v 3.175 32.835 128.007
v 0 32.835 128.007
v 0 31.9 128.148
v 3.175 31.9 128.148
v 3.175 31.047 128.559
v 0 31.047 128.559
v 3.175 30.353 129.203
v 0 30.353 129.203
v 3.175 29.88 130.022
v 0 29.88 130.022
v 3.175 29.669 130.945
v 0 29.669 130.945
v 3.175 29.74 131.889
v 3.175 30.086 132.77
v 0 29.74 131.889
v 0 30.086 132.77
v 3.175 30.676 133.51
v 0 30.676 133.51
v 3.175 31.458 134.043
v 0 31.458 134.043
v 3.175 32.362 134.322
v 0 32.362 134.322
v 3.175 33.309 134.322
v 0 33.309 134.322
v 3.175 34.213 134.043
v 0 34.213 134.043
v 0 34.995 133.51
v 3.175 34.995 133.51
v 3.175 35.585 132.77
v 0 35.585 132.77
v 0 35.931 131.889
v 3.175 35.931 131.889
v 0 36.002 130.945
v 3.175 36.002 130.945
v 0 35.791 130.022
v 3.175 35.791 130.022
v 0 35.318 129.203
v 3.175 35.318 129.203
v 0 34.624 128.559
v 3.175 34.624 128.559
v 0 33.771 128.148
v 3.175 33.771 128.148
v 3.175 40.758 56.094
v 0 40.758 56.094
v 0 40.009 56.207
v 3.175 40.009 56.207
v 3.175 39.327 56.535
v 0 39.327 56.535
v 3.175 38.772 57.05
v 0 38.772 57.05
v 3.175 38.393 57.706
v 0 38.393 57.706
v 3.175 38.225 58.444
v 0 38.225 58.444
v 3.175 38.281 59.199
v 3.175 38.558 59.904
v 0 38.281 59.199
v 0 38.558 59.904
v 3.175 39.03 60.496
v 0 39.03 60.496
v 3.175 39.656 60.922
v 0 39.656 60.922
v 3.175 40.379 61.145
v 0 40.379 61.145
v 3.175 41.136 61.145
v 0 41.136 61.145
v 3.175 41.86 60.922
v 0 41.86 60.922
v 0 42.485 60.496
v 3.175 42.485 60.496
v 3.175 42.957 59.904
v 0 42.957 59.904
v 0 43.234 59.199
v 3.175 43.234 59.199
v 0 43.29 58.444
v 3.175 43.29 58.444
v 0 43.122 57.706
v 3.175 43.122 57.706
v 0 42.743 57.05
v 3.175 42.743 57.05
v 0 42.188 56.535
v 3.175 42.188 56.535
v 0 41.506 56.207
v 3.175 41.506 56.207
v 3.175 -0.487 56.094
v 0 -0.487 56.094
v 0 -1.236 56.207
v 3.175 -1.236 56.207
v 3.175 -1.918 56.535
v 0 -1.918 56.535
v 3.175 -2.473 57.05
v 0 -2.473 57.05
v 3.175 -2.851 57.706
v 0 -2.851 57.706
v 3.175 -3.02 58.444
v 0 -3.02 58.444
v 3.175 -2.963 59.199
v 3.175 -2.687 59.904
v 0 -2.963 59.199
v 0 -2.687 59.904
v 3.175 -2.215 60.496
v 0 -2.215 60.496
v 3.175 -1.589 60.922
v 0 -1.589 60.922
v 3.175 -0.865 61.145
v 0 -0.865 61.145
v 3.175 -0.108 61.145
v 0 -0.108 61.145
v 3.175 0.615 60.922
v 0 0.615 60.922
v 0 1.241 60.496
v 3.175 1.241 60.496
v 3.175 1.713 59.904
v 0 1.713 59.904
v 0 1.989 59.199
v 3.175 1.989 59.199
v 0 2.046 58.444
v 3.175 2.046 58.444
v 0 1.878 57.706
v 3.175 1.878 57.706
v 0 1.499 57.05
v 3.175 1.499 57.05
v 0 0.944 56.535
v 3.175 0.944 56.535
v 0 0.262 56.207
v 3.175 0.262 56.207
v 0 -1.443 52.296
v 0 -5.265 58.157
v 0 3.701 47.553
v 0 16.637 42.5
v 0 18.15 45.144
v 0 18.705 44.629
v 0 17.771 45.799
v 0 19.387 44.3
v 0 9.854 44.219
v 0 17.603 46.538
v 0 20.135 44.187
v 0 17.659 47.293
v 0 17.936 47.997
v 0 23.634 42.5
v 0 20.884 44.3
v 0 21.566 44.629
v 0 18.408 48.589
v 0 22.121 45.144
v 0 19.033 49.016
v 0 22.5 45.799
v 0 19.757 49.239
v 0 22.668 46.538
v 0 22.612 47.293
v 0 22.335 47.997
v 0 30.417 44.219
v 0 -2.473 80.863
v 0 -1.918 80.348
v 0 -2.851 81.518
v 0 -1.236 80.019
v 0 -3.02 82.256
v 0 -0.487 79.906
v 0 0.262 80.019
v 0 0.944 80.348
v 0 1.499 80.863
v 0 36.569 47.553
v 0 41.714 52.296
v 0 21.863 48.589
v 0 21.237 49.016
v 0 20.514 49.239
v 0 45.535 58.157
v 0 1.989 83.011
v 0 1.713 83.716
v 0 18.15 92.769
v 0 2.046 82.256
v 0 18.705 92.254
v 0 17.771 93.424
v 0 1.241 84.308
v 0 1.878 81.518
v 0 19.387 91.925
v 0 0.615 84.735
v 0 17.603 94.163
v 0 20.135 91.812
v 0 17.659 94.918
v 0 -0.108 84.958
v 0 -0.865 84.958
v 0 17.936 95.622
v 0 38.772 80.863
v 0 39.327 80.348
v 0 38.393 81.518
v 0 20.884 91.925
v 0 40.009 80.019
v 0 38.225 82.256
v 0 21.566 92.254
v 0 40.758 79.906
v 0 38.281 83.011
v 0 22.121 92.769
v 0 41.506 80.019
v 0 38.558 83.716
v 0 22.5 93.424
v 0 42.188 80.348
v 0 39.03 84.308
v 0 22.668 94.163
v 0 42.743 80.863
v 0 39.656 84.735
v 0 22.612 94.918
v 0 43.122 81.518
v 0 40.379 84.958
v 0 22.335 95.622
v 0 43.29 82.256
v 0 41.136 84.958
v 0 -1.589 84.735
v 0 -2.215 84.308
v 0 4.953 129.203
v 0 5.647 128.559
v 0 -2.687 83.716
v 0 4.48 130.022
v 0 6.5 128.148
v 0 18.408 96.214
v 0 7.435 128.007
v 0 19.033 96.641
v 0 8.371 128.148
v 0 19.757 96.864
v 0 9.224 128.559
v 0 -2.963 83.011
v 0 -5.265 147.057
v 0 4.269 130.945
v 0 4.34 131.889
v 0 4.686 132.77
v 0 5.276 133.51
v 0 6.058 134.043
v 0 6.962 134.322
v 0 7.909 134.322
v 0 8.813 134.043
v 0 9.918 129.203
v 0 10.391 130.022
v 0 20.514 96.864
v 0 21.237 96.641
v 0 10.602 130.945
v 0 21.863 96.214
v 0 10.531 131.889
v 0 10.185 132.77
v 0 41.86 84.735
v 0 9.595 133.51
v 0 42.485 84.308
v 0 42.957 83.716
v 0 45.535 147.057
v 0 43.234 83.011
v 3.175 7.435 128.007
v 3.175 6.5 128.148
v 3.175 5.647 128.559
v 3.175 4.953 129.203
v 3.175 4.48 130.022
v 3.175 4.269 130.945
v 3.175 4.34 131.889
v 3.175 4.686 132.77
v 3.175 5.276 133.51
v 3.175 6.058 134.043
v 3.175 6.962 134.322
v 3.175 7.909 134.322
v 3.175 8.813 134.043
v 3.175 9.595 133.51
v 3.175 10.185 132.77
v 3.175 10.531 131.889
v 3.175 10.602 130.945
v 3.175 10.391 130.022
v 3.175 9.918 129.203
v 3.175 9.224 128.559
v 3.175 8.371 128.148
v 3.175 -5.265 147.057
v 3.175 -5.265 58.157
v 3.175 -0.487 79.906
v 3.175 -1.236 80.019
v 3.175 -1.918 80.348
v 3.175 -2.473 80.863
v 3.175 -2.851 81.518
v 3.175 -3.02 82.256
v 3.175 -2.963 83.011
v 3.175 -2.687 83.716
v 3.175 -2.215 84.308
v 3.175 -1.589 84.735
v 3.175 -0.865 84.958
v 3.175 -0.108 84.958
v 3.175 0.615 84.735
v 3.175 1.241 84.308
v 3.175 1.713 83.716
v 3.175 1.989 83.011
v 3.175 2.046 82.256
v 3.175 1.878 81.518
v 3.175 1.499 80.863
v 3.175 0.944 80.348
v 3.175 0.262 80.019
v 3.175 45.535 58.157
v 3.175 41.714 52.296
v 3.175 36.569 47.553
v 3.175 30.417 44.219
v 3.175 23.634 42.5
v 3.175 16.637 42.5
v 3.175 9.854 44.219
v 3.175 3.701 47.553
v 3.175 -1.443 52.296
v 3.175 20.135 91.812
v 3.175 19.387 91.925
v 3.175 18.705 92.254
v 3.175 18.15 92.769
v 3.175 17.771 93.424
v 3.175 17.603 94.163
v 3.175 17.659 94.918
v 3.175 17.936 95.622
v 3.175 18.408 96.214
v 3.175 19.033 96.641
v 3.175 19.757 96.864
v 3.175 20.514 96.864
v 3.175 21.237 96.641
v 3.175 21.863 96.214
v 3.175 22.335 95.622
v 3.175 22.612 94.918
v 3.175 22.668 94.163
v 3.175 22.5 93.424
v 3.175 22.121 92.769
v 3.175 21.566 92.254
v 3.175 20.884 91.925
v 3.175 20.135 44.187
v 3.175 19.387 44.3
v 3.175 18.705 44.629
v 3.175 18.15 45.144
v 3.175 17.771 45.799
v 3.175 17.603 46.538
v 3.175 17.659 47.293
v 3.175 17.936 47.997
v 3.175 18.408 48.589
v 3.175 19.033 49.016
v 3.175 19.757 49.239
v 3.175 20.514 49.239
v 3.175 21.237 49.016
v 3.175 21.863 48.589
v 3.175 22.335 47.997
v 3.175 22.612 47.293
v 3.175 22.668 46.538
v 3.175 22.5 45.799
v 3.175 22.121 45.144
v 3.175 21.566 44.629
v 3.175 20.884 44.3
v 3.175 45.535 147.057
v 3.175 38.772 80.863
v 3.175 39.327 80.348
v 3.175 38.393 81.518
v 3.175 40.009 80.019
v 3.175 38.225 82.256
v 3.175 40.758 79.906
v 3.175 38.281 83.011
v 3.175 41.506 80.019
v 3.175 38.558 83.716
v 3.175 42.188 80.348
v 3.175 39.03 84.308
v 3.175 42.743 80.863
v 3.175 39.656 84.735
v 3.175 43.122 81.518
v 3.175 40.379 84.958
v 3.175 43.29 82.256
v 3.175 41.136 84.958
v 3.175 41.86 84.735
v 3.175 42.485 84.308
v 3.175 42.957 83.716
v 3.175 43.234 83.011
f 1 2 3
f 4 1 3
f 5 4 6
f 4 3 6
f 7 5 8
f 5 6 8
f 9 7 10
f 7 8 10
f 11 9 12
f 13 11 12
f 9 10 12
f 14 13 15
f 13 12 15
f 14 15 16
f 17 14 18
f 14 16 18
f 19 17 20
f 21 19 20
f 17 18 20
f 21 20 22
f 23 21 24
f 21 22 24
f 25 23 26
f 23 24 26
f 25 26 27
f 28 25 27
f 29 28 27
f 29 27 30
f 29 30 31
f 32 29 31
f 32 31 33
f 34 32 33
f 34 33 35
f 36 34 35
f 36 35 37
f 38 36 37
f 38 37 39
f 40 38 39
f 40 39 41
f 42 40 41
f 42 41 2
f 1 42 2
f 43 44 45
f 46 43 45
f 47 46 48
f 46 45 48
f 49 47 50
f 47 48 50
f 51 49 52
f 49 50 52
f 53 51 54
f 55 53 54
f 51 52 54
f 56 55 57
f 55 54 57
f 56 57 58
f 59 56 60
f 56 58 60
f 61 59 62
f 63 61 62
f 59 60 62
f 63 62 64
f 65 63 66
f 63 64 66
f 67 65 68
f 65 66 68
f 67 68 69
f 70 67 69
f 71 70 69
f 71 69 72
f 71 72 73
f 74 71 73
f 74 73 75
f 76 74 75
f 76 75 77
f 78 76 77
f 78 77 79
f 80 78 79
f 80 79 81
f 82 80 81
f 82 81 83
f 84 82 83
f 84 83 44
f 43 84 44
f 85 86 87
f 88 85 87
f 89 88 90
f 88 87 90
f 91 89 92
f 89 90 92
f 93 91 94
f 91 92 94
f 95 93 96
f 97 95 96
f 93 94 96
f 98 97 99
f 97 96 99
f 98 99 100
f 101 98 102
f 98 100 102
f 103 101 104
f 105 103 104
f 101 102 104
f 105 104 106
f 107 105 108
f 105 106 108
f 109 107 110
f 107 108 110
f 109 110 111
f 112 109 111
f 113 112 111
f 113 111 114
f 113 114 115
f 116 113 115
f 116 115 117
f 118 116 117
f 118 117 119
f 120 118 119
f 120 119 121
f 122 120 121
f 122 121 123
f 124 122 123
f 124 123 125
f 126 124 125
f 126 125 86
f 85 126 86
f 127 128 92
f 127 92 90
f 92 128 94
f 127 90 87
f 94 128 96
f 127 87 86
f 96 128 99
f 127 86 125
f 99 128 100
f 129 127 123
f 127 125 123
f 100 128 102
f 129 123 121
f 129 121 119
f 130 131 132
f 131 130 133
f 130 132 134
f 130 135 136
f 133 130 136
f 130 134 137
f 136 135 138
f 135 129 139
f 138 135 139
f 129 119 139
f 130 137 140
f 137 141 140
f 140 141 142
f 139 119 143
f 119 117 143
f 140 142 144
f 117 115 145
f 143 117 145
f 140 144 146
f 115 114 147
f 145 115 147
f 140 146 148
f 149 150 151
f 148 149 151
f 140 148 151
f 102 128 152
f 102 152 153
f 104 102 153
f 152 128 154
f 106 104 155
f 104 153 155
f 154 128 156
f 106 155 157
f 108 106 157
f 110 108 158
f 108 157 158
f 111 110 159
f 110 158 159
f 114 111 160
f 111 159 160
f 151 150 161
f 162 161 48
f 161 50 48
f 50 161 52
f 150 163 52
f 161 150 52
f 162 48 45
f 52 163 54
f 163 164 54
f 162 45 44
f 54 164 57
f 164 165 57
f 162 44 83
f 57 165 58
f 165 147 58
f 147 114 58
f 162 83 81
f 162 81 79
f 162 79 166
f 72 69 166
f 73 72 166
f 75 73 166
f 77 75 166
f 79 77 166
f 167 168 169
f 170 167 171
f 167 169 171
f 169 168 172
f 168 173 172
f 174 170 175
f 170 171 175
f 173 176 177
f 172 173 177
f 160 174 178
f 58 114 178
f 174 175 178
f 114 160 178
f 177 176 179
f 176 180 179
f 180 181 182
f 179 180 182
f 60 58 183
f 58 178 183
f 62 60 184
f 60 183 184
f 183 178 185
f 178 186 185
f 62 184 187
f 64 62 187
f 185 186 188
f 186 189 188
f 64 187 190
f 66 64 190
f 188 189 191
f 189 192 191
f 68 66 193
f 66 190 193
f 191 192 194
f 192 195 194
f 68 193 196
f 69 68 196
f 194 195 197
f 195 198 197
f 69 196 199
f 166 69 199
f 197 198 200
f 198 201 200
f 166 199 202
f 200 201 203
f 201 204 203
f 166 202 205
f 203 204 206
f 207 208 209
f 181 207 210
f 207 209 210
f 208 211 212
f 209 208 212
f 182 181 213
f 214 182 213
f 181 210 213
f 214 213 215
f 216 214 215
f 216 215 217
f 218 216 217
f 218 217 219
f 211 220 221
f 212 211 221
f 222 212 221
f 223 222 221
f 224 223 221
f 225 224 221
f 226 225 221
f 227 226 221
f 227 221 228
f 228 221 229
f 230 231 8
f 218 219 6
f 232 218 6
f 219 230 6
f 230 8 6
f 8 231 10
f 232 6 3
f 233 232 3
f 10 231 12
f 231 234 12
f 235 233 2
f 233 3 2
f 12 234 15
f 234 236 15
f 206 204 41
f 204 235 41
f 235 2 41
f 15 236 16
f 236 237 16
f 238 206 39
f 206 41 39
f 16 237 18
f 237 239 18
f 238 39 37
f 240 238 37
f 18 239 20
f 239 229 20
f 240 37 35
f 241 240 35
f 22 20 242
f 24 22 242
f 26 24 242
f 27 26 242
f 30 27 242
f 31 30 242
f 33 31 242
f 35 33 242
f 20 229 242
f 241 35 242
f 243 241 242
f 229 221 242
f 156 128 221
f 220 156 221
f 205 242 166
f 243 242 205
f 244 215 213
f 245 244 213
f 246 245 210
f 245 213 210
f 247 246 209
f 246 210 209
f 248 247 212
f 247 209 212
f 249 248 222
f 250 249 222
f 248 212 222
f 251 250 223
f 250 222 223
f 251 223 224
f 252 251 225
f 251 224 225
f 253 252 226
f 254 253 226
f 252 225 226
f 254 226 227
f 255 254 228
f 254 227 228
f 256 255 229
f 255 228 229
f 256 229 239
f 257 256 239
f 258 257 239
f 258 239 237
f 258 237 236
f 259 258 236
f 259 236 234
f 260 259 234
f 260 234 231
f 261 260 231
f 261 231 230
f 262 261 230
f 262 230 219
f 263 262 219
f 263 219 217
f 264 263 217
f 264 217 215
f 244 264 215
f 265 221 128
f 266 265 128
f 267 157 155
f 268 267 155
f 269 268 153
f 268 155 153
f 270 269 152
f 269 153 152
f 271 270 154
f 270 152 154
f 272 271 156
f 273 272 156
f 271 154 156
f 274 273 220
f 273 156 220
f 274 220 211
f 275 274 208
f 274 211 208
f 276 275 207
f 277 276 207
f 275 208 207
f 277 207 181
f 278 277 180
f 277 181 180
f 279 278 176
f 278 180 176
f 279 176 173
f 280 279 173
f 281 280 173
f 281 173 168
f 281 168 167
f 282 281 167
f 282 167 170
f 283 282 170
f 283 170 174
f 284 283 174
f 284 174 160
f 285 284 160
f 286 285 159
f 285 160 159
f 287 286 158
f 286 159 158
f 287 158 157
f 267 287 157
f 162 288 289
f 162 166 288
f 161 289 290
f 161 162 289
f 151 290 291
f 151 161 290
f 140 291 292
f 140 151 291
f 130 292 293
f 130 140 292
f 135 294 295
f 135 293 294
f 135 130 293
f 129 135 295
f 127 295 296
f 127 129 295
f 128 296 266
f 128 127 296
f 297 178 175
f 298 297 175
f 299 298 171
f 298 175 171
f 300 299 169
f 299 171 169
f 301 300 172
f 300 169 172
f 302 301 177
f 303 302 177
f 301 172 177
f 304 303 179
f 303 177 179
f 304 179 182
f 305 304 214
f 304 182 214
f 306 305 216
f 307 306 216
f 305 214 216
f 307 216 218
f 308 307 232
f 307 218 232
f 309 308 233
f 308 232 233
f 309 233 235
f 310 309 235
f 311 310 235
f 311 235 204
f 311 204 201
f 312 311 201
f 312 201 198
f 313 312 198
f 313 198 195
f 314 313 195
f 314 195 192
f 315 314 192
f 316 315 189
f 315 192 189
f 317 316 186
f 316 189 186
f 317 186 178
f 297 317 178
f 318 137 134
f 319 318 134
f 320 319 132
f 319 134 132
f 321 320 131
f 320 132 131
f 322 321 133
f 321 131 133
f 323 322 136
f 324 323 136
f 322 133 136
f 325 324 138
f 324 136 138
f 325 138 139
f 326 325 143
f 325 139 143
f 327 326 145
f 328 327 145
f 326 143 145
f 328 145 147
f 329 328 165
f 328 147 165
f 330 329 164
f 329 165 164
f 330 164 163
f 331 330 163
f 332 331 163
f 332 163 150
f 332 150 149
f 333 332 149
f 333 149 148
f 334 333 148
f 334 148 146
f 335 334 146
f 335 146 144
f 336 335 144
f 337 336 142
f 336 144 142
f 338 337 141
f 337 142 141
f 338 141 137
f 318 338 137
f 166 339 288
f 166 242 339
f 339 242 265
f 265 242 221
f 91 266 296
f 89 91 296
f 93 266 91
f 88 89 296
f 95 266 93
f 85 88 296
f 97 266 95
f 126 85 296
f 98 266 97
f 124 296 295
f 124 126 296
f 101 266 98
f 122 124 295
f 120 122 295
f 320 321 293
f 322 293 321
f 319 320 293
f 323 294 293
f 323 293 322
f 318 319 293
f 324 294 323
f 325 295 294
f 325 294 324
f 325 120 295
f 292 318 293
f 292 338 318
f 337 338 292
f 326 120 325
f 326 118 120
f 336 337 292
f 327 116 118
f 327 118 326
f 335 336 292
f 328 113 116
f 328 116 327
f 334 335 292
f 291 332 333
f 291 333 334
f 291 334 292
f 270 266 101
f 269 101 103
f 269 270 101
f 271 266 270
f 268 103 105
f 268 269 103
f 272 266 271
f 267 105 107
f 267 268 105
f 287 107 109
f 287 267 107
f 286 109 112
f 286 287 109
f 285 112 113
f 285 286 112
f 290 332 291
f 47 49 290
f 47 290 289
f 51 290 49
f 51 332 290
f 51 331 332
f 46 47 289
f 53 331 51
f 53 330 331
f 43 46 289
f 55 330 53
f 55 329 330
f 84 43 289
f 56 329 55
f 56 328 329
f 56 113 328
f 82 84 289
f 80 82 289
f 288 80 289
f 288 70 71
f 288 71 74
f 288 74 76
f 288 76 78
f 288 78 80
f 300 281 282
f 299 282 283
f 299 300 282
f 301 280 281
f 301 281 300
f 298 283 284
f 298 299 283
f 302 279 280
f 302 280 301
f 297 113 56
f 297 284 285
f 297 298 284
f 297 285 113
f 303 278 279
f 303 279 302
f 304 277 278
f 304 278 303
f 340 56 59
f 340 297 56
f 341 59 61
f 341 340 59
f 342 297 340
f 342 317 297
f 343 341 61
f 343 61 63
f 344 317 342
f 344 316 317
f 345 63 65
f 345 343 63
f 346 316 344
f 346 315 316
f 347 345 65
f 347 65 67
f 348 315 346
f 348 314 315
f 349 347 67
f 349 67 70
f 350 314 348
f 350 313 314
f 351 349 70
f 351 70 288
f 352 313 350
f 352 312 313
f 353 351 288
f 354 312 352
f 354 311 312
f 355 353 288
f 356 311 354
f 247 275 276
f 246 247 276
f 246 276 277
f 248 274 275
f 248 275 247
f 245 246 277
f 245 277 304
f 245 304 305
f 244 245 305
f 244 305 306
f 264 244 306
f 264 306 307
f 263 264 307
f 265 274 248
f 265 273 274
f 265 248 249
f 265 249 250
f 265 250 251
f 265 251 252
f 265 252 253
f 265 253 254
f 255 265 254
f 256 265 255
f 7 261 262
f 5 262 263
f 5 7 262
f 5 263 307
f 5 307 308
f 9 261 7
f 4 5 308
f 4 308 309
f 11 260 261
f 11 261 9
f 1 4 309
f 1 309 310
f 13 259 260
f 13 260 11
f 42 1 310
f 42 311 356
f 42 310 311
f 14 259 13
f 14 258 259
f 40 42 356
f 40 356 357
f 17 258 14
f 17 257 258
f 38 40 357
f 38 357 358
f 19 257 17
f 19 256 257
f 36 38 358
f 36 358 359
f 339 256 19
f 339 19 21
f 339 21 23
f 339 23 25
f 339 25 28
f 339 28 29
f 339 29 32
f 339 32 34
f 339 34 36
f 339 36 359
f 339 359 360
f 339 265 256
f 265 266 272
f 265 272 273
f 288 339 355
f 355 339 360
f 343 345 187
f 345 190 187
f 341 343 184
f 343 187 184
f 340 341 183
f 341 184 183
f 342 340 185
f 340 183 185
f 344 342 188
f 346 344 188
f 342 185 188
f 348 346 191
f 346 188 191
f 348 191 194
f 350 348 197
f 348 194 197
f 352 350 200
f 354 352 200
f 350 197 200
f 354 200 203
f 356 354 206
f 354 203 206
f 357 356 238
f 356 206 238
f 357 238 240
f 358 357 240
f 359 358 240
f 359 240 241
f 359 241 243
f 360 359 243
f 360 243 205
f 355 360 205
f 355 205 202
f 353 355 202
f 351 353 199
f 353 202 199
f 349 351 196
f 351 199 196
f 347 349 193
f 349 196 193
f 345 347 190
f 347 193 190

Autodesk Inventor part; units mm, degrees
ref_plane "YZ Plane" through (0, 0, 0) normal (1, 0, 0) x (0, 1, 0)
ref_plane "XZ Plane" through (0, 0, 0) normal (0, 1, 0) x (-1, 0, 0)
ref_plane "XY Plane" through (0, 0, 0) normal (0, 0, 1) x (1, 0, 0)
sketch "Sketch1" plane through (0, 0, 0) normal (1, 0, 0) x (0, 1, 0)
  line L0 (45.5354, 147.0574) -> (-5.2646, 147.0574)
  line L1 (-5.2646, 147.0574) -> (-5.2646, 58.1574)
  arc A0 (-5.2646, 58.1574) -> (45.5354, 58.1574) centre (20.1354, 70.5399) ccw
  line L2 (45.5354, 147.0574) -> (45.5354, 58.1574)
  point P0 (20.1354, 42.2824)
  dimension "d0" = 50.8
  dimension "d1" = 88.9
  dimension "d2" = 15.875
extrude "Extrusion1" add sketch "Sketch1" along normal blind 3.175
sketch "Sketch2" plane through (3.175, 0, 0) normal (1, 0, 0) x (0, 0, -1)
  line L0 (-147.0574, 45.5354) -> (-147.0574, -5.2646) projected
  line L1 (-82.4462, 40.7576) -> (-58.6337, -0.4869)
  point P0 (-82.4462, 40.7576)
  point P1 (-94.3524, 20.1354)
  point P2 (-58.6337, 40.7576)
  point P3 (-46.7274, 20.1354)
  point P4 (-58.6337, -0.4869)
  point P5 (-82.4462, -0.4869)
  dimension "d5" = 47.625
  dimension "d6" = 30
hole "Hole1" at (3.175, 40.7576, 82.4462) at (3.175, 20.1354, 94.3524) at (3.175, 40.7576, 58.6337) at (3.175, 20.1354, 46.7274) at (3.175, -0.4869, 58.6337) at (3.175, -0.4869, 82.4462) direction (-1, 0, 0) diameter 5.08 end through all
sketch "Sketch3" plane through (3.175, 0, 0) normal (1, 0, 0) x (0, 0, -1)
  line L0 (-147.0574, 45.5354) -> (-147.0574, -5.2646) projected
  line L1 (-58.1574, 45.5354) -> (-147.0574, 45.5354) projected
  point P0 (-131.1824, 32.8354)
  point P1 (-131.1824, 7.4354)
  dimension "d18" = 25.4
  dimension "d19" = 12.7
  dimension "d20" = 15.875
hole "Hole2" at (3.175, 32.8354, 131.1824) at (3.175, 7.4354, 131.1824) direction (-1, 0, 0) diameter 6.35 end through all
properties part number "Hub Mount Plate"
